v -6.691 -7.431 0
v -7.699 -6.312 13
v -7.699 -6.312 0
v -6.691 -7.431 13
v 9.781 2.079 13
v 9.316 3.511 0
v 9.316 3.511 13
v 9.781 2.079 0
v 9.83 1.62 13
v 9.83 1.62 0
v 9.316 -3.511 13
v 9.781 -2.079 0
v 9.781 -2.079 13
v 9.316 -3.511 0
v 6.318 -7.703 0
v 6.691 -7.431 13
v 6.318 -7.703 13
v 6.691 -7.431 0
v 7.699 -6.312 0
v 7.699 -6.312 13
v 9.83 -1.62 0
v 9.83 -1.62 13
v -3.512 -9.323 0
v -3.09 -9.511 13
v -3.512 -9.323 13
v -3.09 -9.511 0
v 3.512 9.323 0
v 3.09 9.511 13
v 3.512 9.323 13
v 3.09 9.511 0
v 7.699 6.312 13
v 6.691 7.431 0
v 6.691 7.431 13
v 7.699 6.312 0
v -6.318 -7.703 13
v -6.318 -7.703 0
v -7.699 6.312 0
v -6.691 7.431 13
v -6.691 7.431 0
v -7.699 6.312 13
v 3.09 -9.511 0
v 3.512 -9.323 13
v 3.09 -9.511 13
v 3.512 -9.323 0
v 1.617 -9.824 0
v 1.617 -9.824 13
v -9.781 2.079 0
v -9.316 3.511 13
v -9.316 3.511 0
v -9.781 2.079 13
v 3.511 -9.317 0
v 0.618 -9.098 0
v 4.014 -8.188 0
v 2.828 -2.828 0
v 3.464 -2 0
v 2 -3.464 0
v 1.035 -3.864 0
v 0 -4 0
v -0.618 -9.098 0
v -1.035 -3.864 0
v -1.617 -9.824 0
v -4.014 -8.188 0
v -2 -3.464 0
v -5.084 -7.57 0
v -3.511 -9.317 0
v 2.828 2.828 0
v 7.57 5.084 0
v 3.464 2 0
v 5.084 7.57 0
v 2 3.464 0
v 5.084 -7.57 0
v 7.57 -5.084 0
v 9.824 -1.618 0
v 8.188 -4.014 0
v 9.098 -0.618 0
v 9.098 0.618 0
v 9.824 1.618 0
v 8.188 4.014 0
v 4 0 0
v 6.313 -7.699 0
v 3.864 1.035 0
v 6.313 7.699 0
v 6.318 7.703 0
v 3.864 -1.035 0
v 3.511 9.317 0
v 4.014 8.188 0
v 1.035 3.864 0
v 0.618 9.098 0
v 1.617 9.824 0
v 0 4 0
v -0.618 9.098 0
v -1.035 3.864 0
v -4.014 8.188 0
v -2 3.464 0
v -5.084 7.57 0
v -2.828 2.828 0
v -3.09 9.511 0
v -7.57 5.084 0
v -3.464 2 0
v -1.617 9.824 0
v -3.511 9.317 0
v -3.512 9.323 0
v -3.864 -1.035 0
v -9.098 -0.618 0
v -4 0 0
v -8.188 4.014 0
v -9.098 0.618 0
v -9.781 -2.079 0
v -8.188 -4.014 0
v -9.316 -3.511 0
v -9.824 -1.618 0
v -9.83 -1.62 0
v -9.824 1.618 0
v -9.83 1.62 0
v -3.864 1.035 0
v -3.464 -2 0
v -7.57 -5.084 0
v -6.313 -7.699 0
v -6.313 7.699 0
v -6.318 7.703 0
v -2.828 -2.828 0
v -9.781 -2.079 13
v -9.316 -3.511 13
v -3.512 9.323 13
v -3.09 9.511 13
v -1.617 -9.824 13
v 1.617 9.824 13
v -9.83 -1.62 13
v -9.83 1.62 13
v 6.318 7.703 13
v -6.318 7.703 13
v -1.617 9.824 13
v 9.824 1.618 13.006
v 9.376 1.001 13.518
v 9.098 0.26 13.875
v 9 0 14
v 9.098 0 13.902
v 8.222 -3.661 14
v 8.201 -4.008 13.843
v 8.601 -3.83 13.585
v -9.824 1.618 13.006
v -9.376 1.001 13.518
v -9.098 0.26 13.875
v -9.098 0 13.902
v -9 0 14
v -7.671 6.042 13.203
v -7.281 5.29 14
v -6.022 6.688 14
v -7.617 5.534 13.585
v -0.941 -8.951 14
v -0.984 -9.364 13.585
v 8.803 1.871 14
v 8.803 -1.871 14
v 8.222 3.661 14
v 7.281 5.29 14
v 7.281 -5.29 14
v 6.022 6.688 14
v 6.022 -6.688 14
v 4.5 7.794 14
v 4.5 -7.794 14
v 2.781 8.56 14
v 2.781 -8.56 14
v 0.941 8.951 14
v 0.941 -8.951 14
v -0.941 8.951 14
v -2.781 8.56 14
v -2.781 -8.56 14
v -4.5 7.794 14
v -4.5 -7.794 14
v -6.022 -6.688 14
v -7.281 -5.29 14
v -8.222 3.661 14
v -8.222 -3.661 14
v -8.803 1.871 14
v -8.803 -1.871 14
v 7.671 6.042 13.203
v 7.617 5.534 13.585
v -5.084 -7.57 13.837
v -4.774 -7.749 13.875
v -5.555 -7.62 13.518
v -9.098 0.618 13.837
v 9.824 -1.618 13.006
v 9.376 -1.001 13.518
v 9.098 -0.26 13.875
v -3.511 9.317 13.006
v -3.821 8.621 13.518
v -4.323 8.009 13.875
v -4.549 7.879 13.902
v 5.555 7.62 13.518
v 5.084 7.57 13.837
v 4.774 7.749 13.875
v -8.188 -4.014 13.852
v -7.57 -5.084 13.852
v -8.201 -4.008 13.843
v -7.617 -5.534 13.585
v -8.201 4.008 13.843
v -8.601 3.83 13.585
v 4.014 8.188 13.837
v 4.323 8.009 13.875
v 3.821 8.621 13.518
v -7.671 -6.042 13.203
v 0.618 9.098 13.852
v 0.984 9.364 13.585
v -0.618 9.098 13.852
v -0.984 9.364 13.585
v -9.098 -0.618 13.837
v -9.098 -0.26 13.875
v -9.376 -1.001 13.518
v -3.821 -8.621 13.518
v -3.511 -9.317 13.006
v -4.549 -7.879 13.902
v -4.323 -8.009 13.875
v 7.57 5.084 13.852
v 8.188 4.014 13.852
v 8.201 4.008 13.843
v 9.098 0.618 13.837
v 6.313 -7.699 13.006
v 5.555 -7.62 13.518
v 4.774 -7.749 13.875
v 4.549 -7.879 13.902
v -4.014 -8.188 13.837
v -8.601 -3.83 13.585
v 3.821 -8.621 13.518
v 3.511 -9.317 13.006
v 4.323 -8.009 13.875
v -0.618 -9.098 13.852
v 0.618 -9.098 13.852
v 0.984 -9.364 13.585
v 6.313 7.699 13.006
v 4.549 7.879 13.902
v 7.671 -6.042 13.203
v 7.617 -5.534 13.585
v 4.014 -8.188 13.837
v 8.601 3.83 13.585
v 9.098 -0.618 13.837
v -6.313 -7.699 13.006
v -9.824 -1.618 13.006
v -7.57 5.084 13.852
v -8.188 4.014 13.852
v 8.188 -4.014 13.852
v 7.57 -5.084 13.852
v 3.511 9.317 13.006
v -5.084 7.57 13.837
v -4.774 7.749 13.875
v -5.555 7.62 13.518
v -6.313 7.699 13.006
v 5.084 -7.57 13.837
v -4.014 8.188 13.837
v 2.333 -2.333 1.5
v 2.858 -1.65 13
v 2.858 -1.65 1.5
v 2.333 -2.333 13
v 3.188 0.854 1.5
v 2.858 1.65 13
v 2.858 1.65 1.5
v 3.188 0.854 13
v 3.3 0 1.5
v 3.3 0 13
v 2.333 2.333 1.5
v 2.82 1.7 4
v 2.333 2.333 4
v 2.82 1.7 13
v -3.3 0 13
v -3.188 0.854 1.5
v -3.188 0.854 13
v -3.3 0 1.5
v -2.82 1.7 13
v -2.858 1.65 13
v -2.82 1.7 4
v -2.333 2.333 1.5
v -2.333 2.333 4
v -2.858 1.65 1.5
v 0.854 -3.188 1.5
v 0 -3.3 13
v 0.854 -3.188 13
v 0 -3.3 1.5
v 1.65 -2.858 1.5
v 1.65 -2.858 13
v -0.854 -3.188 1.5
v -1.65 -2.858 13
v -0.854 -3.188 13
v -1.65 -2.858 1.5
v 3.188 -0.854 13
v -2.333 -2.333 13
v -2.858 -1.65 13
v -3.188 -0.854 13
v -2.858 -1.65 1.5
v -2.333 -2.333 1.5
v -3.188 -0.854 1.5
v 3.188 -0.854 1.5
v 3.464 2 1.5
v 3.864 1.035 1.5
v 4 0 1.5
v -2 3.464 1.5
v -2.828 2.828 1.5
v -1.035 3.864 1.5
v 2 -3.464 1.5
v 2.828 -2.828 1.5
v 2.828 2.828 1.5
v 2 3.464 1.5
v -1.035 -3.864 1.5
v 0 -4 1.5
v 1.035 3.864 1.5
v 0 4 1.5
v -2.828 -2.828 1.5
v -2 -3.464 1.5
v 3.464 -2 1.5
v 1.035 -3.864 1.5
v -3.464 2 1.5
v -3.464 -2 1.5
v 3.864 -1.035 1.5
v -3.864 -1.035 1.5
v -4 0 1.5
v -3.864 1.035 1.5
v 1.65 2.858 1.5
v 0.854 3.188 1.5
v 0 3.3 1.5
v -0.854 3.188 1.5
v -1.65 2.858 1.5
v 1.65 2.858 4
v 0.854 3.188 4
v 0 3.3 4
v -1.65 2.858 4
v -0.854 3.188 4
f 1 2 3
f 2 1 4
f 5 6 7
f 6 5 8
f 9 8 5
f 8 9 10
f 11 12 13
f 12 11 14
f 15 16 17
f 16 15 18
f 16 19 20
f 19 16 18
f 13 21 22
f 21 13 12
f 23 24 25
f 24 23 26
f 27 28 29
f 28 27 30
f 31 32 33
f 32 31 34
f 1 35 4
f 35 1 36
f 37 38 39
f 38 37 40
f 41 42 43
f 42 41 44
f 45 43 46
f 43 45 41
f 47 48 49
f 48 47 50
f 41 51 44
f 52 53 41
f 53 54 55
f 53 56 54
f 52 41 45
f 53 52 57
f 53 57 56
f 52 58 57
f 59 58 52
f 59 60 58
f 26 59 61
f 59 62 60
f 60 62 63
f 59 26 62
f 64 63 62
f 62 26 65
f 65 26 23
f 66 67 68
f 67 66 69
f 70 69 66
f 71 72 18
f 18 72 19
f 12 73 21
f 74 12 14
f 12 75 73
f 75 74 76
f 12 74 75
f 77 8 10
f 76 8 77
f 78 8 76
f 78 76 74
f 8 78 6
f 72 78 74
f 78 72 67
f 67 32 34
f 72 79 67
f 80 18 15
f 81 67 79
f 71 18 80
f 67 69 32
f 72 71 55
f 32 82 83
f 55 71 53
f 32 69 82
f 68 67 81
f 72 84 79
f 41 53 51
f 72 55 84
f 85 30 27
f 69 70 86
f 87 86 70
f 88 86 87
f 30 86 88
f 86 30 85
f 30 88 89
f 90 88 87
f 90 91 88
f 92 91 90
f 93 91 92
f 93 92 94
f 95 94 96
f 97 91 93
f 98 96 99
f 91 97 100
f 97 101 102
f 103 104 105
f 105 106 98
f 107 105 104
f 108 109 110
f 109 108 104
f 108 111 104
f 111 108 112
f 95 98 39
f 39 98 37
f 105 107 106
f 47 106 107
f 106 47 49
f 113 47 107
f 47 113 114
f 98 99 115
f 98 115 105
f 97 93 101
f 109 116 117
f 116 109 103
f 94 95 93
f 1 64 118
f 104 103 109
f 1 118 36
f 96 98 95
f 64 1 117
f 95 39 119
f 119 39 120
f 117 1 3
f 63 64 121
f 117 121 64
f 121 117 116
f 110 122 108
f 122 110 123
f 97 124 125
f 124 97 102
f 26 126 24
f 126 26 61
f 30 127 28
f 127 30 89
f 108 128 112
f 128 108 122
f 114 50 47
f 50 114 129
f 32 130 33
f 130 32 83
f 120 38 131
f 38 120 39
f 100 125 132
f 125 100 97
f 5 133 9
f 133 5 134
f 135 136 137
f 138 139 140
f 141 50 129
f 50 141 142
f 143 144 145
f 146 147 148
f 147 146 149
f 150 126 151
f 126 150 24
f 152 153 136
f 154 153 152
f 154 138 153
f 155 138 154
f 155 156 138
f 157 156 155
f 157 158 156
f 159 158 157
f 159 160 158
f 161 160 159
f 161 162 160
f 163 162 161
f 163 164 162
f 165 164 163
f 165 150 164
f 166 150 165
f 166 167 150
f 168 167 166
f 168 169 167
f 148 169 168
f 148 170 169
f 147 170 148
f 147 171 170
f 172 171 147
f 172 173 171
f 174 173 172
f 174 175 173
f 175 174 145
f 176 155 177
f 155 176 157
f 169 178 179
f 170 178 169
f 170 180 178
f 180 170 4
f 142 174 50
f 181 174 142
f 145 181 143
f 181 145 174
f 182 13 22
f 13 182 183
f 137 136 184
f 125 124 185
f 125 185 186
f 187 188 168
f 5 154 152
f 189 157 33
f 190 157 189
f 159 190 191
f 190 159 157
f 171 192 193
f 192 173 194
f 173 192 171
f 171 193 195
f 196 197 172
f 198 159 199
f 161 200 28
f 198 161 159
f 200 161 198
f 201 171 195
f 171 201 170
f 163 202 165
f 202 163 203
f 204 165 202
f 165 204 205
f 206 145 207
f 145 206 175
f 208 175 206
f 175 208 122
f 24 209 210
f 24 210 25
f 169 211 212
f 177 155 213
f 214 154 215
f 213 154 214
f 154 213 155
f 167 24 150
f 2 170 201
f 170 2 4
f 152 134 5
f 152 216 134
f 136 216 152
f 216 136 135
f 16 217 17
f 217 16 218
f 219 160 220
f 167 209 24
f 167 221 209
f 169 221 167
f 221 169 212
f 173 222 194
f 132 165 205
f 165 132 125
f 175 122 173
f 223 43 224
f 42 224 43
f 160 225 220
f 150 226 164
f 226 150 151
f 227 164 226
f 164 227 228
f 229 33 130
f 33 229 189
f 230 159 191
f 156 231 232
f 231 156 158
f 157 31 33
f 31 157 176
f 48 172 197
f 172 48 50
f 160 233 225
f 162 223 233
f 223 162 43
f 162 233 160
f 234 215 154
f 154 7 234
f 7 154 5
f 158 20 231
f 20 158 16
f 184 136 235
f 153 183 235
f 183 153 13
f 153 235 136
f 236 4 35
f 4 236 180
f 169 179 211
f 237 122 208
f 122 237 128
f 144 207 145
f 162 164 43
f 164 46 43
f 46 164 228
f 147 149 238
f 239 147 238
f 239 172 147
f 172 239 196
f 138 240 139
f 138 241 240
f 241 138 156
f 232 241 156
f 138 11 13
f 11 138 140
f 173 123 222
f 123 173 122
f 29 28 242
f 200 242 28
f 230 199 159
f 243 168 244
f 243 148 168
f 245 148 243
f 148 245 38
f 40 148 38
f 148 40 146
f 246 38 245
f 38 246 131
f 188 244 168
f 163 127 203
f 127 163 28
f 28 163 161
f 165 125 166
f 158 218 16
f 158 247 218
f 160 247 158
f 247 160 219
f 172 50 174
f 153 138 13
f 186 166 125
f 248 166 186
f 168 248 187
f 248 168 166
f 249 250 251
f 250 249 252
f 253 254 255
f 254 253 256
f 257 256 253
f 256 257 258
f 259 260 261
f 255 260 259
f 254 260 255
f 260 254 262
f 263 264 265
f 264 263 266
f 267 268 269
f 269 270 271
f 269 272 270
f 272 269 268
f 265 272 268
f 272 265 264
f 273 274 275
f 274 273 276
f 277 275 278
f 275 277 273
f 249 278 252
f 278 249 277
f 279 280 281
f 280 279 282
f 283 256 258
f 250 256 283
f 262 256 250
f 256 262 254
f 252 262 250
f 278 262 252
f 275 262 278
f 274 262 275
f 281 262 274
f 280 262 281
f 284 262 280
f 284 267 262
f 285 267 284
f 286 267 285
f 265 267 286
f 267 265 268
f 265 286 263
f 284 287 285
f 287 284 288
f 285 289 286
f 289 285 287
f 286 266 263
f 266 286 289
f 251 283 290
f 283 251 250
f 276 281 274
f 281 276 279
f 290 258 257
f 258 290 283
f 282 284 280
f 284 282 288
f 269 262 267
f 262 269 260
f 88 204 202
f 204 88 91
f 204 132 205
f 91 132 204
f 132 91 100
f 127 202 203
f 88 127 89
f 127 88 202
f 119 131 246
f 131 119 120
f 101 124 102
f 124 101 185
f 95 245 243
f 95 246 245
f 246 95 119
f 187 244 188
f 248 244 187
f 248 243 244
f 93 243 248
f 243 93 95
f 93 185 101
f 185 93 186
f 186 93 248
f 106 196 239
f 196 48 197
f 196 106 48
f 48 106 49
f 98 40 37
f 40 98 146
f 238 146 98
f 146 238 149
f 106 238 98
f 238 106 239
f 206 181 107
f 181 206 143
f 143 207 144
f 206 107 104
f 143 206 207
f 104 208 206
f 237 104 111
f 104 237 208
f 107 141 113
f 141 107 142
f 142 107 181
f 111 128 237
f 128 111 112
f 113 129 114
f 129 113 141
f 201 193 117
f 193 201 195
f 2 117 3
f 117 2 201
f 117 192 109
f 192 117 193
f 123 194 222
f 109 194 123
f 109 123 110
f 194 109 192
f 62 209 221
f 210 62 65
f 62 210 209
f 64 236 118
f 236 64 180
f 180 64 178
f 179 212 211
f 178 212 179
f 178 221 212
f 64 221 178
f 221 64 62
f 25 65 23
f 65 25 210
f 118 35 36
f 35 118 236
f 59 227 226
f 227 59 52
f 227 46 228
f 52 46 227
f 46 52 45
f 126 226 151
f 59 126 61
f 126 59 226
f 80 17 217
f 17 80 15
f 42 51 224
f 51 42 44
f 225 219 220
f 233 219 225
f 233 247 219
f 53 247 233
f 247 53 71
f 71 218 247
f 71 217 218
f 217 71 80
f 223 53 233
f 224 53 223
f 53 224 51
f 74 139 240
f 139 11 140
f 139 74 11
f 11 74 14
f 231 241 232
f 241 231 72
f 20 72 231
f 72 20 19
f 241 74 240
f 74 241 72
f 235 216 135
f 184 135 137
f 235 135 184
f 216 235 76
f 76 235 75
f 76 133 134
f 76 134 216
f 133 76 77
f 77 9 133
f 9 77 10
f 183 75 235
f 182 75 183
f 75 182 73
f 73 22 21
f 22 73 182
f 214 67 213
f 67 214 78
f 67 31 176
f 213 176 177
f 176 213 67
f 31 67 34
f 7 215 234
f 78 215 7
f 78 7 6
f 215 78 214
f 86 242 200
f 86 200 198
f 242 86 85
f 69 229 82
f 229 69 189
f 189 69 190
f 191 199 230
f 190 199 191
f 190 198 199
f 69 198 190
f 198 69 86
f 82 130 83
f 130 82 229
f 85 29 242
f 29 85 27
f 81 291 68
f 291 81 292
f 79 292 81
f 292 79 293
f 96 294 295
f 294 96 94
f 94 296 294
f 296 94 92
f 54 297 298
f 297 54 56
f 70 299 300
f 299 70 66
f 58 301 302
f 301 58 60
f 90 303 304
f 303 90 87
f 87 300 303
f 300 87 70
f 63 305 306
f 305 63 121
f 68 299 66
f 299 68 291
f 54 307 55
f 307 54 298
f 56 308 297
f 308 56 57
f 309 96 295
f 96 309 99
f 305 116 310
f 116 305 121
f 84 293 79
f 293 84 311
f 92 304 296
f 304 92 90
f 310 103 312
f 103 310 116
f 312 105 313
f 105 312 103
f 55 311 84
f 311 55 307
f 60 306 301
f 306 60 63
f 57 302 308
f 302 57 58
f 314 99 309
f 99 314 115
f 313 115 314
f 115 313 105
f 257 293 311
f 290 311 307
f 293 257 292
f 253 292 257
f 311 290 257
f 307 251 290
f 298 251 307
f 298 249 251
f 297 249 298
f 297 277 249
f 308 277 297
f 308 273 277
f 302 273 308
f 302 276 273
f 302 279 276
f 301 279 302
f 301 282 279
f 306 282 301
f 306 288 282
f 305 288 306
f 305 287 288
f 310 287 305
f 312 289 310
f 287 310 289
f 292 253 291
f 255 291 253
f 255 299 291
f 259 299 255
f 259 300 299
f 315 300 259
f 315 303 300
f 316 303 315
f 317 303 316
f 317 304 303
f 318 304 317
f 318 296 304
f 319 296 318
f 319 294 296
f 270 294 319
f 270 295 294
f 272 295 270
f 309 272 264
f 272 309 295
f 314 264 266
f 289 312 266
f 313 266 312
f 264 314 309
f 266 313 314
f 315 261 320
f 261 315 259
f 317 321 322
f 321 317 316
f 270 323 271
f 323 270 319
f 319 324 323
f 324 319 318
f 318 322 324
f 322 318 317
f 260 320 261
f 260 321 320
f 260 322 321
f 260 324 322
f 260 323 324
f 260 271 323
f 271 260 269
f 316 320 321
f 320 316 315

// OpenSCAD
// ..............................
// Prusa i3 Things
// LCD Box_knob
// Oktay Gülmez
// 02/07/2014
// GNU GPL v3
// ..............................

module hole(){
difference(){
  union(){
    
   translate([0,0,0]) cylinder(h=10, r=3.3, $fn=24);

    
  }
 translate([-3,1.7,0]) cube([6,3,10]);
 
}
}

difference(){
  union(){
    
     translate([0,0,0]) cylinder(h=13, r=10);
     translate([0,0,13]) cylinder(h=1, r1=10, r2=9);
    
     
    
  }
   translate([0,0,3]) hole();
   translate([0,0,0]) cylinder(h=1.5, r=4, $fn=24);
   translate([0,0,1.5]) cylinder(h=2.5, r=3.3, $fn=24);


   for ( i = [0 : 11] )
{
    rotate( i * 360 / 12, [0, 0, 1])
    translate([0, 11, 0])
    cylinder(h=18, r=2, $fn=10);
}
   
}
